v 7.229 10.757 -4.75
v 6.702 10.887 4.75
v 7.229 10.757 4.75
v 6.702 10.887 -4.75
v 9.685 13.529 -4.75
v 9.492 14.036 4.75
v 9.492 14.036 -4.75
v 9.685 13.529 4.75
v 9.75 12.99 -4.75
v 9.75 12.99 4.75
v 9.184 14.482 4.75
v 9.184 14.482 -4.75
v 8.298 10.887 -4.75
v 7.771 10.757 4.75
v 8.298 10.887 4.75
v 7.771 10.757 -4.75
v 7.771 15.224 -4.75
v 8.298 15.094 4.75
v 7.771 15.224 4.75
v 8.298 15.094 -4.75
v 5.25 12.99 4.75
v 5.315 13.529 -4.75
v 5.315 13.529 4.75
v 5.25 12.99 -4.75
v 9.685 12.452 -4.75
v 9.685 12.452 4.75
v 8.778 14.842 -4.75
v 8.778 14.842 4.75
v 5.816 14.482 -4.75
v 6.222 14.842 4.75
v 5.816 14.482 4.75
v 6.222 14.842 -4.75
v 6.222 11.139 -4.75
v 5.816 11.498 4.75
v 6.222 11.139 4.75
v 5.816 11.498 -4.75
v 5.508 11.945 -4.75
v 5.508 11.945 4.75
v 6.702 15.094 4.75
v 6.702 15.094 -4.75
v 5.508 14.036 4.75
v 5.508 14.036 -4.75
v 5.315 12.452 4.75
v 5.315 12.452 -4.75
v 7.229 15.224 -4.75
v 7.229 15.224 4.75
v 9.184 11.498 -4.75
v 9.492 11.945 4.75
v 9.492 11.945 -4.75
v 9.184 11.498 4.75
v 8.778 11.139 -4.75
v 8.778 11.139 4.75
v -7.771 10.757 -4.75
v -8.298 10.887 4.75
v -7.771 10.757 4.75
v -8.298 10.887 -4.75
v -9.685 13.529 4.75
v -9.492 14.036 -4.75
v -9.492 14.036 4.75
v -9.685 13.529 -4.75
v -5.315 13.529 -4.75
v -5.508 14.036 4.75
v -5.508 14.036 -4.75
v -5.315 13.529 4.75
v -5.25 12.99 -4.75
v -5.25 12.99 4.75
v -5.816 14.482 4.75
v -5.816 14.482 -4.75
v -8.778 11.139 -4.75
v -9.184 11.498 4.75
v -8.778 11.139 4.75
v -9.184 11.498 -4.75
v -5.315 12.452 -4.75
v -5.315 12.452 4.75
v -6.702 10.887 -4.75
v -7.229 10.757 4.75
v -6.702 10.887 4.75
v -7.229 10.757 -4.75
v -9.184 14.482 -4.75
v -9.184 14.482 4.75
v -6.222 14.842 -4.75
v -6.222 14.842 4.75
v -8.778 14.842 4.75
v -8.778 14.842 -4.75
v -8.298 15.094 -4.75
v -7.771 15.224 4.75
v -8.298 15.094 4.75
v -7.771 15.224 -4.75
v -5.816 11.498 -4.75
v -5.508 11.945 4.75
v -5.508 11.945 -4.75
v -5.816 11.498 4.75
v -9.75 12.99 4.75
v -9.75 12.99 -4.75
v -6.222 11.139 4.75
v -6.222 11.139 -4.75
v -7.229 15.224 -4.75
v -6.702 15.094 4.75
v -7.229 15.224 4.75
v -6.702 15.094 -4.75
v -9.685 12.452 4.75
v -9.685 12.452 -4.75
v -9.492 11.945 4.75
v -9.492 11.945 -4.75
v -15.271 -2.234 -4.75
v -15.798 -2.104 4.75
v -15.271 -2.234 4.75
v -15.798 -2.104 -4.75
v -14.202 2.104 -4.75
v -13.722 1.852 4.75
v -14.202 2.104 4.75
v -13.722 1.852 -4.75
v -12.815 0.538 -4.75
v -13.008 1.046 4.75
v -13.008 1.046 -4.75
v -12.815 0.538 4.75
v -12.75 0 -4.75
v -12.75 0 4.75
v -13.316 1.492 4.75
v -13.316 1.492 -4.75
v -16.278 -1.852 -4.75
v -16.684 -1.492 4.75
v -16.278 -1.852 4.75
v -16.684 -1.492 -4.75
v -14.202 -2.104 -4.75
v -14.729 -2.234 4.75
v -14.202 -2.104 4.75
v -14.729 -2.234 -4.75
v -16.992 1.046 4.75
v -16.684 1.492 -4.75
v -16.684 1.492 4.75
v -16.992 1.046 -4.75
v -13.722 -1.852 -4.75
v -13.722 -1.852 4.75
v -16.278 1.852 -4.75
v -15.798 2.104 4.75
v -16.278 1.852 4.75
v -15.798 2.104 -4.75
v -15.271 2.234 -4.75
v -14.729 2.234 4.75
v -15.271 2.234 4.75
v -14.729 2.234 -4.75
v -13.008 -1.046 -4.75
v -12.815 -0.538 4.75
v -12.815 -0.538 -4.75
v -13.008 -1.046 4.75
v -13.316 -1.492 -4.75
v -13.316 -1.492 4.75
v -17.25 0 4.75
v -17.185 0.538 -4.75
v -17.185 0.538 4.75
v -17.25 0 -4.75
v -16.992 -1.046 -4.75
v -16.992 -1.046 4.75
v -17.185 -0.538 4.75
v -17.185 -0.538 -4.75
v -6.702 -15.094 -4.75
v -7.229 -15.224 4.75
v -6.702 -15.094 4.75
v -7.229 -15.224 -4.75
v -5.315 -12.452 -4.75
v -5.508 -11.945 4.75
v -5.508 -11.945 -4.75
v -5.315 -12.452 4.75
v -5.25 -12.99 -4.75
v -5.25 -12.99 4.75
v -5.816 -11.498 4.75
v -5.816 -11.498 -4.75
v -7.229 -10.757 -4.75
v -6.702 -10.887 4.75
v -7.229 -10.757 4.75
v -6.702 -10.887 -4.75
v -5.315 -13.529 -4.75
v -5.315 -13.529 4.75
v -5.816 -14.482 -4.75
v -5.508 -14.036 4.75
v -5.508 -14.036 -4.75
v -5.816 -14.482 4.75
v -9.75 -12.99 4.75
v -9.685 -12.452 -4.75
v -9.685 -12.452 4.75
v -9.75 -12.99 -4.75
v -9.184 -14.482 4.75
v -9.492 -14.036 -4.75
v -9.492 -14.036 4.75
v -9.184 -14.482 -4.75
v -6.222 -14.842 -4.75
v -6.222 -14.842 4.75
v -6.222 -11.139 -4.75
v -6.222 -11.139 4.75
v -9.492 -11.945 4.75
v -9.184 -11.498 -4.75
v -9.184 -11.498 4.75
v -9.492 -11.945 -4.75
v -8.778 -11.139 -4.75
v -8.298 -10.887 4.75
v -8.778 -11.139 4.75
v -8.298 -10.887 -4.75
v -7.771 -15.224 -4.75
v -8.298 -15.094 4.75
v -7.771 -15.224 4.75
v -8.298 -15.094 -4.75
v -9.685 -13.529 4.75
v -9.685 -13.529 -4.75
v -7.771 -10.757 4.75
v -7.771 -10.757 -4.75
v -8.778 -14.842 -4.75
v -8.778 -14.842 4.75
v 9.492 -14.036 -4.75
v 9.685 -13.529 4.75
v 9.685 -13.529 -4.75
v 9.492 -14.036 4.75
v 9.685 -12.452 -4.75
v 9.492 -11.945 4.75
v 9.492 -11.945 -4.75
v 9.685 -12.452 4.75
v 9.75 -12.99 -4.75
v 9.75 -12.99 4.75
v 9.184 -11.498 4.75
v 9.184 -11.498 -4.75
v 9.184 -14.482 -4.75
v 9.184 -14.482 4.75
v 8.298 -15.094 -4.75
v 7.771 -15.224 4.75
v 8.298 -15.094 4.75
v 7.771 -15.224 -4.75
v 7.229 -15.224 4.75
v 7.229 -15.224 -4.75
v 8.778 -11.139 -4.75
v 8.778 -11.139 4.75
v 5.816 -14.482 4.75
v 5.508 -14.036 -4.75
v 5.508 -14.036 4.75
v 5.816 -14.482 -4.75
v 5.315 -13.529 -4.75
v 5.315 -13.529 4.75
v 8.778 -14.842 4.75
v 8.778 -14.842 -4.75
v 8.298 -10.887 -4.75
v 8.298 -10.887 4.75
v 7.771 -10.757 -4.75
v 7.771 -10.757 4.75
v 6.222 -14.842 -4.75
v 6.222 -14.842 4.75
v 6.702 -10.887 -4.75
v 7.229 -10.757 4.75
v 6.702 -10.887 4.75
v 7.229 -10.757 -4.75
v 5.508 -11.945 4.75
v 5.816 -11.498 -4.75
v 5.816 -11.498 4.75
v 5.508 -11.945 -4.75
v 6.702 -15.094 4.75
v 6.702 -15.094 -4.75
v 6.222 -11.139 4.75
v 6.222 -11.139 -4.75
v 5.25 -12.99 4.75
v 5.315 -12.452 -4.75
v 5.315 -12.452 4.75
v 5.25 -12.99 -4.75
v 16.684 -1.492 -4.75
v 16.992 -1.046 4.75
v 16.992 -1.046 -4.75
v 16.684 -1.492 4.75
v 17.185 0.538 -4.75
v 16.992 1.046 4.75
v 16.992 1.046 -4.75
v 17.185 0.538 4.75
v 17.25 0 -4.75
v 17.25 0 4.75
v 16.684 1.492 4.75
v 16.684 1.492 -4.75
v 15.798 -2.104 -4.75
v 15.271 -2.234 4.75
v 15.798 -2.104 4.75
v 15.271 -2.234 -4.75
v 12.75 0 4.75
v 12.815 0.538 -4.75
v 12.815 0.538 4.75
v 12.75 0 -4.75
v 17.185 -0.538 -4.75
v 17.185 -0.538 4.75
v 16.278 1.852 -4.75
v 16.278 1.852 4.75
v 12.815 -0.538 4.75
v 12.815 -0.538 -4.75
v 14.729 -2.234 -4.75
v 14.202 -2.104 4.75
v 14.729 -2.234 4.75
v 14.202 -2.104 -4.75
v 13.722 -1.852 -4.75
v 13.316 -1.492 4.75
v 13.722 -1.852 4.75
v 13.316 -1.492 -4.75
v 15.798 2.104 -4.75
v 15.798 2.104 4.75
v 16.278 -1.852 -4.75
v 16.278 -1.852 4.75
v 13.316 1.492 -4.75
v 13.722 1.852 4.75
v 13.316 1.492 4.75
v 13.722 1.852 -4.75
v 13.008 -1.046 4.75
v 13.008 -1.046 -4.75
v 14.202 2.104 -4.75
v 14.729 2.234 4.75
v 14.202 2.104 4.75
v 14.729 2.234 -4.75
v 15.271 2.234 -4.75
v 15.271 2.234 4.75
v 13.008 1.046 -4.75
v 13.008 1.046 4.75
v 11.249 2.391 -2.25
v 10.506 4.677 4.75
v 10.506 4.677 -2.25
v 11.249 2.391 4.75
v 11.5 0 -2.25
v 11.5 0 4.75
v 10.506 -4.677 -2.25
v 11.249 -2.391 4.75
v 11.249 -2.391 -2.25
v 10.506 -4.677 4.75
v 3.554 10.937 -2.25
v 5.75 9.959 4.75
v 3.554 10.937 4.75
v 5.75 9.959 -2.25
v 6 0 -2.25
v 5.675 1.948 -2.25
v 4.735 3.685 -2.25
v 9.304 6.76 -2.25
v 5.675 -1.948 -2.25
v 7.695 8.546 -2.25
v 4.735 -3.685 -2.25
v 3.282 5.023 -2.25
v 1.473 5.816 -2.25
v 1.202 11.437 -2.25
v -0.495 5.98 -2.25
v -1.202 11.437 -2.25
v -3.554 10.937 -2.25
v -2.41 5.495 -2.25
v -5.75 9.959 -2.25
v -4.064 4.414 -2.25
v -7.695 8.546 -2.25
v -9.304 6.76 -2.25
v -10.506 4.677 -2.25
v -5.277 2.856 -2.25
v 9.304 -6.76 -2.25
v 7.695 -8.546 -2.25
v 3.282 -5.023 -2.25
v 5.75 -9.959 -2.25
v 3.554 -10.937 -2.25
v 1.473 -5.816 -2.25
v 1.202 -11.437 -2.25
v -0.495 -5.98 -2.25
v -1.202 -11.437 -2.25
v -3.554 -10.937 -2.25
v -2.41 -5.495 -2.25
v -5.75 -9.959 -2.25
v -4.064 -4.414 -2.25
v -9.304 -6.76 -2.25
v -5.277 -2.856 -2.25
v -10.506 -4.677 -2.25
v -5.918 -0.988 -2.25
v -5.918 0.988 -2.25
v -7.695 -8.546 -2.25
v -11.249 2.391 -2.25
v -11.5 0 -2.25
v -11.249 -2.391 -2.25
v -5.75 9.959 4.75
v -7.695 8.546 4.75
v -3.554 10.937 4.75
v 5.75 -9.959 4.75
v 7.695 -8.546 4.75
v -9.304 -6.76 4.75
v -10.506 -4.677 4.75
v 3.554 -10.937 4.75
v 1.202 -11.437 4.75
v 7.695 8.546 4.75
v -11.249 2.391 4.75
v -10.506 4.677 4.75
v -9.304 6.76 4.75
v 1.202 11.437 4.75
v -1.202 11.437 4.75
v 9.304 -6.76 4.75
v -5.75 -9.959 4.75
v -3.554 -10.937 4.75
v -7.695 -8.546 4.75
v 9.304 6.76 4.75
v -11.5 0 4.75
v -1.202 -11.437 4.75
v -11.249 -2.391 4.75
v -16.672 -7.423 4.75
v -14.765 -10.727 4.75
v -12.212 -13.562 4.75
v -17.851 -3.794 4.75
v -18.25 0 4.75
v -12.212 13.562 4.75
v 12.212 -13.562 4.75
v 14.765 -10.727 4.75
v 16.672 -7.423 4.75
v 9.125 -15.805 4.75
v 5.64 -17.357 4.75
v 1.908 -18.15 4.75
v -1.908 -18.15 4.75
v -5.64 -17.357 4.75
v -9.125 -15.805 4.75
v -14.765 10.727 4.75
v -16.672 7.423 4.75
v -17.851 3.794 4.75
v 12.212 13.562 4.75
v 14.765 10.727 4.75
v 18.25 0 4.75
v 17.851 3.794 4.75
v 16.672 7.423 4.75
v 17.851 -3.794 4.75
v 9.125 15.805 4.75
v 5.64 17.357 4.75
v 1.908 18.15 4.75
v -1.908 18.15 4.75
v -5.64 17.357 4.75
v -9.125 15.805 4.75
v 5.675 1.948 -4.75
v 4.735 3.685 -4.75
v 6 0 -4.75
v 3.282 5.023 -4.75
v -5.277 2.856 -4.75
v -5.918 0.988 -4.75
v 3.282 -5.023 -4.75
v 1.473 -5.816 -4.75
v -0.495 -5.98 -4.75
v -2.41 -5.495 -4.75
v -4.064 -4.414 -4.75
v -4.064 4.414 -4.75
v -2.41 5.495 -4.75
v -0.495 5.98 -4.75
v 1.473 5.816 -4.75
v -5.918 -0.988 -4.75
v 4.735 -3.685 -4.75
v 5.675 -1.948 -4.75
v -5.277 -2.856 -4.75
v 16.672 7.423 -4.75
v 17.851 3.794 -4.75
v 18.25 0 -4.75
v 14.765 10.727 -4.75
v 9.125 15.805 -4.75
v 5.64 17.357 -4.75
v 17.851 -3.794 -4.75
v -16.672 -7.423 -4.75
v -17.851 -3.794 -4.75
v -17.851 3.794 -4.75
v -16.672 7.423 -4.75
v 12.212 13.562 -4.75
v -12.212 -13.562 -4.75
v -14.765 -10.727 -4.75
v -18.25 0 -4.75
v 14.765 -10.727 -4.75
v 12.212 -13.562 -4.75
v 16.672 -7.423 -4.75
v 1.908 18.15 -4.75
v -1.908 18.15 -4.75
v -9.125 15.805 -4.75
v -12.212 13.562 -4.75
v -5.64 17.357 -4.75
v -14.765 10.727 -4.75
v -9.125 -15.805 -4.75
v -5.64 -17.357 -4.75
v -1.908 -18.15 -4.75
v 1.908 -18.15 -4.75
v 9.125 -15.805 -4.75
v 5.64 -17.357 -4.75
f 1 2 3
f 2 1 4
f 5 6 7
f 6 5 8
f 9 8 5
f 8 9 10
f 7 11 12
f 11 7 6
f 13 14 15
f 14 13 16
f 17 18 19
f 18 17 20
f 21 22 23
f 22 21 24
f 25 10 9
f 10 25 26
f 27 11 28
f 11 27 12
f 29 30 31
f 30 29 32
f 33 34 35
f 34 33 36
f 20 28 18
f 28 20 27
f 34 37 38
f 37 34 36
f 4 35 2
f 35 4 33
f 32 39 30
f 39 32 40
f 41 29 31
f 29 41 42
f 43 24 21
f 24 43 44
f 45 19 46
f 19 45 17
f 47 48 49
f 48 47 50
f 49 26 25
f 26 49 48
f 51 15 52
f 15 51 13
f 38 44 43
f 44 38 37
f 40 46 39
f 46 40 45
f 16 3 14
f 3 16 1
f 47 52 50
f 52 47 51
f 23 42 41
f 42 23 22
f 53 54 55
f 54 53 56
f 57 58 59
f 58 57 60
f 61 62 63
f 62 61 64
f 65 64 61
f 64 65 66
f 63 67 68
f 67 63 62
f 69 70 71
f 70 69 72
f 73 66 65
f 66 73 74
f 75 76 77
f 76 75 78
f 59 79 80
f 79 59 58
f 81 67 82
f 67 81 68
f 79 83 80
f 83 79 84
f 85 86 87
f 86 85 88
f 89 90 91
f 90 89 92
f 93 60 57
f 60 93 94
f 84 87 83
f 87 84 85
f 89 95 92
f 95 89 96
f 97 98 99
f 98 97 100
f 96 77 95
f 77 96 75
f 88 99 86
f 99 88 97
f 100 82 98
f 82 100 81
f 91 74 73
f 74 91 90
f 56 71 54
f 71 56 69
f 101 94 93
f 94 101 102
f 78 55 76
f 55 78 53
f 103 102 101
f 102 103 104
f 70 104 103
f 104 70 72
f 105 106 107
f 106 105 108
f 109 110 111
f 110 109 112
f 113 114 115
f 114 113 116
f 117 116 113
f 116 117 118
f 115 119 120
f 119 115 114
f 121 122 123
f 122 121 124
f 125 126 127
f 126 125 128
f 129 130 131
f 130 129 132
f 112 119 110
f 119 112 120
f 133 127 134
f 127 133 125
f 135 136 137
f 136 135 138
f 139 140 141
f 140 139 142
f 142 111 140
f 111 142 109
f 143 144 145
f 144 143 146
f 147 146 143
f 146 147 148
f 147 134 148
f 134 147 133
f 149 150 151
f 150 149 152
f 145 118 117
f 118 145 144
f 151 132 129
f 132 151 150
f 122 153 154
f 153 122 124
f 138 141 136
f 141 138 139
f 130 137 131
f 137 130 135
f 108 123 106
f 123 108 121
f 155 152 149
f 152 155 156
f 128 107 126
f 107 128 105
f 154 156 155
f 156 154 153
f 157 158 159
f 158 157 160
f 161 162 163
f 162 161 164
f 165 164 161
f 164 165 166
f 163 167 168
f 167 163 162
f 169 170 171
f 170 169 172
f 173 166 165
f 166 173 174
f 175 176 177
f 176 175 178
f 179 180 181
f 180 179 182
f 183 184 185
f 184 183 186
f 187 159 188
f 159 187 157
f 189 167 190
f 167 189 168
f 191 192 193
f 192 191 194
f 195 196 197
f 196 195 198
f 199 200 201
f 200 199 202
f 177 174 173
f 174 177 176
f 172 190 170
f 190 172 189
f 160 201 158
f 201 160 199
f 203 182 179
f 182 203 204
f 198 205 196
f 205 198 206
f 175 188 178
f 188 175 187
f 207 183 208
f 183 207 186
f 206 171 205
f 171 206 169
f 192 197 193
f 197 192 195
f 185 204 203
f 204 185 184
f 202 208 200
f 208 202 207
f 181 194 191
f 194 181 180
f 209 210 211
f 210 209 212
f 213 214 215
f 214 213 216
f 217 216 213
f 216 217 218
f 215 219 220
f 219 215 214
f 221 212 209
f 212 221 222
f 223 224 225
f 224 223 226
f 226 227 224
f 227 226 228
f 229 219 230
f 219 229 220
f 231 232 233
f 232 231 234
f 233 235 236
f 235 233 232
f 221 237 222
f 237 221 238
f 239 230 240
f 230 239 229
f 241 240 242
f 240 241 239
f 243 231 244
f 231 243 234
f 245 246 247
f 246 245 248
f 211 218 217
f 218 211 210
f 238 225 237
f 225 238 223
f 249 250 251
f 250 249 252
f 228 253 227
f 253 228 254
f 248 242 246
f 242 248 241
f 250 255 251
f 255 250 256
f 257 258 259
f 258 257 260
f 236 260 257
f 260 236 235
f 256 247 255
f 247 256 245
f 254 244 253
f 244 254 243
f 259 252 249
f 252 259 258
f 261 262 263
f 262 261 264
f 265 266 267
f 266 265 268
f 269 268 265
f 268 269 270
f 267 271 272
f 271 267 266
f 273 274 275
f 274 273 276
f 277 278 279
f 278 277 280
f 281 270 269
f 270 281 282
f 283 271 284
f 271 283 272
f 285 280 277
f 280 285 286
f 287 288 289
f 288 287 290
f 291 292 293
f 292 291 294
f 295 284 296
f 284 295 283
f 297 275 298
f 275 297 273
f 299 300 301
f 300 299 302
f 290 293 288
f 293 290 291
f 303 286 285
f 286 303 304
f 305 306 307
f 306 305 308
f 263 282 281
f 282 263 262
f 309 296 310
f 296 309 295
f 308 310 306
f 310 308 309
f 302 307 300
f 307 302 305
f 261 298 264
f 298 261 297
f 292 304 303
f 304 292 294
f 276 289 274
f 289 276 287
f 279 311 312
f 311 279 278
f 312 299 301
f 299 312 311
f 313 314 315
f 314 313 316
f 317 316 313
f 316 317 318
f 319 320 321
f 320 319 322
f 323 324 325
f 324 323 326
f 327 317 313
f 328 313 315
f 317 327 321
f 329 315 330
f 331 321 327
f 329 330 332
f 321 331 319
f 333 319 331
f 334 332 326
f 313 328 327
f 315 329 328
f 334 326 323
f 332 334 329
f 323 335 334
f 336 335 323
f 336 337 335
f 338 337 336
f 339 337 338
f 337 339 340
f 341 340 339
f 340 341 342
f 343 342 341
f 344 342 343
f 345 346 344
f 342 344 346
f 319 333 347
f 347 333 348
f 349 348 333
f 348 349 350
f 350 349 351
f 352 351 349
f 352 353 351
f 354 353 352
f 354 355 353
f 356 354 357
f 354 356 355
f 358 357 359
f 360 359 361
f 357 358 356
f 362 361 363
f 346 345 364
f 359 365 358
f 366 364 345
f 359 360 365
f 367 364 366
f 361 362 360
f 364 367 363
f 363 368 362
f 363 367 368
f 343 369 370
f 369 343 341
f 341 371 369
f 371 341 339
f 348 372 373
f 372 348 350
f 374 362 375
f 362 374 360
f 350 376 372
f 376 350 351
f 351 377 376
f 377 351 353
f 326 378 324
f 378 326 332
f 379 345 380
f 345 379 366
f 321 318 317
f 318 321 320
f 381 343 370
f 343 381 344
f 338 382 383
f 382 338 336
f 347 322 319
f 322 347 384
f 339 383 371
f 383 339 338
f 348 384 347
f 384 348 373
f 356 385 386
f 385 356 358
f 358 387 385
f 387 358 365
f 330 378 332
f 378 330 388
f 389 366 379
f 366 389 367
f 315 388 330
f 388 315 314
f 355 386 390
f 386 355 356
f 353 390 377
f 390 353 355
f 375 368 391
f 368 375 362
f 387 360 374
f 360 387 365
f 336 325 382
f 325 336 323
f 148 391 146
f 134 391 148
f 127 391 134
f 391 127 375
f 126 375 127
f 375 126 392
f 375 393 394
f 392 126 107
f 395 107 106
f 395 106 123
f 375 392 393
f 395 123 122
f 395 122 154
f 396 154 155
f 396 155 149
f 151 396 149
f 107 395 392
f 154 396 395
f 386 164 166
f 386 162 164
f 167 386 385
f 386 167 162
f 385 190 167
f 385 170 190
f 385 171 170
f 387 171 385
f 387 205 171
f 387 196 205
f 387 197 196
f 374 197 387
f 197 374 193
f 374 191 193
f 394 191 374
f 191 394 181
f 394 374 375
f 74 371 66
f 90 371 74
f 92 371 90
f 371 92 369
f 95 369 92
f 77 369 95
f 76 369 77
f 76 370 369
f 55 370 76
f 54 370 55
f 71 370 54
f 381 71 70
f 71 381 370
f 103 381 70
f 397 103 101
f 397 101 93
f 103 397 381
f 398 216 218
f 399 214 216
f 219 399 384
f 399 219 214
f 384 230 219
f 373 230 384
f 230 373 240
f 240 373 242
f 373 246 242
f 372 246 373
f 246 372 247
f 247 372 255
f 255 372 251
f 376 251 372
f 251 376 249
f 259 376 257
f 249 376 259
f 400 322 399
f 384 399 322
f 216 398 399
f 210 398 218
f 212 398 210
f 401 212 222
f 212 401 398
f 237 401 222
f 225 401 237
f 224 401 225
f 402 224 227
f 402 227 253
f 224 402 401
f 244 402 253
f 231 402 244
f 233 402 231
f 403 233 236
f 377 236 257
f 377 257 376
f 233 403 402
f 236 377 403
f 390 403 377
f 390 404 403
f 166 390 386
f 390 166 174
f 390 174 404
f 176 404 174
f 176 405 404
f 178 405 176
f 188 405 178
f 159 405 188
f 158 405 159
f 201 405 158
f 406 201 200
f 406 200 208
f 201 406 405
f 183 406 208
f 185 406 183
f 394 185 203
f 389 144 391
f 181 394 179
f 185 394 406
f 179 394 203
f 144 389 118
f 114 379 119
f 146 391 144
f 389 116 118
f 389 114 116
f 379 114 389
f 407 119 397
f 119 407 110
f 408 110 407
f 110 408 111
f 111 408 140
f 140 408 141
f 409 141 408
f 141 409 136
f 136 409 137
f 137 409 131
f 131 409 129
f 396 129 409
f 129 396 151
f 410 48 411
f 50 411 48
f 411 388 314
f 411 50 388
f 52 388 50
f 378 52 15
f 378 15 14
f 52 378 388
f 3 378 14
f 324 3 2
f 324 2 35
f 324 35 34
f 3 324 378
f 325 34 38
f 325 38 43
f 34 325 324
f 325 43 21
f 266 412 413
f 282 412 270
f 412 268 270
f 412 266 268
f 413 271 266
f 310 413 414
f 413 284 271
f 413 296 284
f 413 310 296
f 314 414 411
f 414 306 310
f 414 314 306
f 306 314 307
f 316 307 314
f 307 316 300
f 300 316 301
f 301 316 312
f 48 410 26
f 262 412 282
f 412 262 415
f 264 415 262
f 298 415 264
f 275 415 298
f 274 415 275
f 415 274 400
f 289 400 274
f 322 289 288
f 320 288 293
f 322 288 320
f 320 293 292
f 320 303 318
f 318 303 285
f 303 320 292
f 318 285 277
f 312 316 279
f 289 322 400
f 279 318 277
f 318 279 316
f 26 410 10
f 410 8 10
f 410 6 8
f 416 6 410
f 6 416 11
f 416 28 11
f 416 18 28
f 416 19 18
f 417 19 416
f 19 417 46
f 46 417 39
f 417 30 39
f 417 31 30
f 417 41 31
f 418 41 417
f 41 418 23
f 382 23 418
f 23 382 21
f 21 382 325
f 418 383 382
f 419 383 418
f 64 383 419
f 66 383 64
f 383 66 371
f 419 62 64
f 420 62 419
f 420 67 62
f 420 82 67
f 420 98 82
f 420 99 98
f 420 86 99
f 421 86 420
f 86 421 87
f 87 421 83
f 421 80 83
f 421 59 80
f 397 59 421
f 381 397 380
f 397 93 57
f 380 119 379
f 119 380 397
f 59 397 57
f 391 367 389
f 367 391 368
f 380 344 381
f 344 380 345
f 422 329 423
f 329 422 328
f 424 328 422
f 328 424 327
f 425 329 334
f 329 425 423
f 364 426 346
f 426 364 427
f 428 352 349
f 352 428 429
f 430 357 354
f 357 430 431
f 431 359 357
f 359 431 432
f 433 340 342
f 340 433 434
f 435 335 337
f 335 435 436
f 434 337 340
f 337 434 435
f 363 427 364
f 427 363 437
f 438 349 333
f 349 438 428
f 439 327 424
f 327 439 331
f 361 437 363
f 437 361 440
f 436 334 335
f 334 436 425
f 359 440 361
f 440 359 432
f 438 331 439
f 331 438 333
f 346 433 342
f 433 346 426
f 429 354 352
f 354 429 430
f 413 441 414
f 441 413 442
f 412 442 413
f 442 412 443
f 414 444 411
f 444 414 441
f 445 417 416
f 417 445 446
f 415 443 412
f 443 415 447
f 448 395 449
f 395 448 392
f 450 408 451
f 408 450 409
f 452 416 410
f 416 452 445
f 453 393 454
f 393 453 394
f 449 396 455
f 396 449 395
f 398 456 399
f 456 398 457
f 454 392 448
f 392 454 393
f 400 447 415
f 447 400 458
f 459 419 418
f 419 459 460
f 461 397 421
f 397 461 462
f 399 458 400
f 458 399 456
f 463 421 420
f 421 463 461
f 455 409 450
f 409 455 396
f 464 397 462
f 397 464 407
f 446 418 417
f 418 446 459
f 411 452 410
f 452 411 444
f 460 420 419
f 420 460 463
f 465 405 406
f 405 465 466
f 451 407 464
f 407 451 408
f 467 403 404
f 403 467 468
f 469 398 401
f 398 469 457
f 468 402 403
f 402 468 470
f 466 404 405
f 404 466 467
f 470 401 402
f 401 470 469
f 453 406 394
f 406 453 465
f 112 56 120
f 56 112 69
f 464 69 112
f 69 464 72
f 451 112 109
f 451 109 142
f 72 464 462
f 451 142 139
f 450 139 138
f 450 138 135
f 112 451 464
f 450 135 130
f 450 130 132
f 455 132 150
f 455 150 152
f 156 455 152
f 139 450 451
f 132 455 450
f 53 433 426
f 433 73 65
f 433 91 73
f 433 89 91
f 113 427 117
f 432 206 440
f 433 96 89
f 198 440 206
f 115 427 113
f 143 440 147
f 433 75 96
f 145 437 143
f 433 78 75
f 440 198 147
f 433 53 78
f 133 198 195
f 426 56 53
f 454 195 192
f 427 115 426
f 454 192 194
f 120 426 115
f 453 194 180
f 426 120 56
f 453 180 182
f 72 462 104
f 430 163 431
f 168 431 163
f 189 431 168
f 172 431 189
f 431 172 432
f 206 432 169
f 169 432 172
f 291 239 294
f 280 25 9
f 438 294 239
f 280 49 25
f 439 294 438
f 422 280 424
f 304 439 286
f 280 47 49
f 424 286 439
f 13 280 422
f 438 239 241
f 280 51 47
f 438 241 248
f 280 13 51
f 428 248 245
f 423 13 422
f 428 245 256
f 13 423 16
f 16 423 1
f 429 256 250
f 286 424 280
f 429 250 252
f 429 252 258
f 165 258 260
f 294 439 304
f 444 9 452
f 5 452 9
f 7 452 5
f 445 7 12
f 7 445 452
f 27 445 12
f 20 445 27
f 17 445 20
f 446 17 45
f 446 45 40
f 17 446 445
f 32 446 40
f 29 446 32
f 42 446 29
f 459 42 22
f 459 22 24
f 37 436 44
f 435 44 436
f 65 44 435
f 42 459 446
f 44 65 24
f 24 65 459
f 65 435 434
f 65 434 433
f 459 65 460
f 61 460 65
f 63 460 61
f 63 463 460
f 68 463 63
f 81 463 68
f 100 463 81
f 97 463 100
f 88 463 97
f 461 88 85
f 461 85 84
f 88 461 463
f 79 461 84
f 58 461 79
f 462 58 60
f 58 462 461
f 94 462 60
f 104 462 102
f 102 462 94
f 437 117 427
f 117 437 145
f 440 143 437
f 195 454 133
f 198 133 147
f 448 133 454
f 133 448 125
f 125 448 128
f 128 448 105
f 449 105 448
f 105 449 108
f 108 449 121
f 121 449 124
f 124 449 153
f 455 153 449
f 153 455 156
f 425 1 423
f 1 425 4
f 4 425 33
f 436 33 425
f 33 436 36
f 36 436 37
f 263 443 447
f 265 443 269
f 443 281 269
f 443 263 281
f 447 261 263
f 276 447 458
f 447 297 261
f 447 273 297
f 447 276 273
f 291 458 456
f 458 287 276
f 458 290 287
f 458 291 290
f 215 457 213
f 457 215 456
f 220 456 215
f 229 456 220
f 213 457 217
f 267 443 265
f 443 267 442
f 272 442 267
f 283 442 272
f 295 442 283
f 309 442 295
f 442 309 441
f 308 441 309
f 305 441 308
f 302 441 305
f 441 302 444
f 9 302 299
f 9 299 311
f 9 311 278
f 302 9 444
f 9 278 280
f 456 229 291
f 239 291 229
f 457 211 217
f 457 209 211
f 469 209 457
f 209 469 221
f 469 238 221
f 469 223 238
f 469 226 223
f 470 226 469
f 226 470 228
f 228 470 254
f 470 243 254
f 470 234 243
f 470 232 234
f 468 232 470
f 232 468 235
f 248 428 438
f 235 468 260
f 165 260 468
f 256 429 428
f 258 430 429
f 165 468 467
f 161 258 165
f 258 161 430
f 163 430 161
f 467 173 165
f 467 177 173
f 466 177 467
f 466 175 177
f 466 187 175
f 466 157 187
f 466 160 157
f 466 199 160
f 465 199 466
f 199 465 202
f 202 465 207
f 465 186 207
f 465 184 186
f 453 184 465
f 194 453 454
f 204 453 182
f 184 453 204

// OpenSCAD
// file: gear_peristaltic.scad
/******************************************************/
/* PLYUMP                                             */
/* file: gear_peristaltic.scad                        */
/* author: Luis Rodriguez                             */
/* version: 0.32                                      */
/* w3b: tiny.cc/lyu                                   */
/* info:                                              */
/******************************************************/

include <parameters.scad>
use <involute_gears.scad>

// Testing
gear_peristaltic();

/* MODULES */

module gear_peristaltic(){
	difference(){
		union(){ // Add
			half_gear_peristaltic();
			mirror([0,0,1])
			half_gear_peristaltic();
		}
		union(){ // Substract
			central_bearings();
			rollers_shafts();
		}
	}
}

// Half herringbone peristaltic gear
module half_gear_peristaltic(){
	gear (number_of_teeth=gear_peristaltic_teeth,
		circular_pitch=circular_pitch,
		pressure_angle=pressure_angle,
		gear_thickness = gear_peristaltic_thickness/2,
		rim_thickness = gear_peristaltic_thickness/2,
		hub_thickness = 0,
		twist=twist/gear_peristaltic_teeth);
}

module central_bearings(){
	cylinder(r=(608zz_outside_diameter+bearings_clearance)/2, h=608zz_thickness*4, $fn = birthday_day, center=true);
}

module rollers_shafts(){
	for ( i = [ 1 : rollers_number ] ) {
		translate( [ rollers_position_minimum_radius * cos( rollers_angle * i ), 
			rollers_position_minimum_radius * sin( rollers_angle * i ),  
			0])
		cylinder( r = rollers_shaft_diameter/2 , h = 608zz_thickness*4, $fn = birthday_day , center=true);
	}
}
// file: parameters.scad
/******************************************************/
/* PLYUMP                                             */
/* file: parameters.scad                              */
/* author: Luis Rodriguez                             */
/* version: 0.32                                      */
/* w3b: tiny.cc/lyu                                   */
/* info: This file contains all the shared parameters */
/******************************************************/

birthday_day = 26;

/* Bearings dimensions (mm) */
bearings_clearance = 0.5; 	// Used to "easily fit bearings into their holes"
// 608zz id=8 od=22 thickness=7
608zz_inside_diameter = 8;
608zz_outside_diameter = 22;
608zz_thickness = 7;

// 624zz id=4 od=13 thickness=5
624zz_inside_diameter = 4;
624zz_outside_diameter = 13;
624zz_thickness = 5;

/* NEMA 17 */
nema_17_height = 42.2;
nema_17_screw_distance = 31.04;
nema_rollers_clearance = 3;

/* ROLLERS */
rollers_number = 6;
rollers_clearance = 4;
rollers_angle = 360 / ( rollers_number );
rollers_wall = 0;
rollers_diameter = 624zz_outside_diameter + rollers_wall * 2;
rollers_radius = rollers_diameter / 2;
rollers_shaft_diameter = 624zz_inside_diameter + bearings_clearance;
rollers_bearings_contacts_thickness = 2;
rollers_bearings_contacts_height = 3;

rollers_width = 624zz_thickness * 5;
rollers_easy_printing_inverted_cone_thickness = 624zz_thickness;

rollers_holder_thickness = 624zz_thickness/2;
rollers_holder_central_bearing_support_thickness = 3;
rollers_holder_central_bearing_support_height = 624zz_thickness;

rollers_radius_plus_clearance = rollers_radius + rollers_clearance / 2;
rollers_position_minimum_radius_minus_roller_radius = ( rollers_radius_plus_clearance - sin( rollers_angle / 2 ) 
	* rollers_radius_plus_clearance ) / sin( rollers_angle / 2 ) ;

if ( rollers_position_minimum_radius_minus_roller_radius < 608zz_inside_diameter) {

	echo(str(" THE ROLLERS WILL CRASH THE CENTRAL SHAFT, change the rollers_position_minimum_radius; " ) );
}

//rollers_position_minimum_radius = 608zz_inside_diameter + rollers_radius;
rollers_position_minimum_radius = rollers_position_minimum_radius_minus_roller_radius + rollers_radius;
echo(str("Rollers position radius = ", rollers_position_minimum_radius ) );

rollers_exterior_radius = rollers_position_minimum_radius + rollers_radius;
echo(str("Rollers exterior radius = ", rollers_exterior_radius ) );

/* Gears */
// Common
gear_ratio = 3;
gear_motor_teeth = 11;
gear_peristaltic_teeth = gear_ratio*gear_motor_teeth;
gear_peristaltic_thickness = 608zz_thickness * 2; // "*2" due to herringbone!

// Circular pitch is calculate through pitch radius for peristaltic and motor gear
// in order to avoid rollers crashing nema 17 motor
//
// 		nema_17_height + rollers_position_minimum_radius + rollers_radius + nema_rollers_clearance = 
// 		gear_peristaltic_pitch_radius + gear_motor_pitch_radius
//
//		gear_peristaltic_pitch_radius + gear_motor_pitch_radius =
//		gear_peristaltic_teeth * circular_pitch / 360 + gear_motor_teeth * circular_pitch / 360 =
//		(gear_peristaltic_teeth + gear_motor_teeth)/360 * circular_pitch
//
//		circular_pitch = 
//		360*(nema_17_height + rollers_position_minimum_radius + rollers_radius + nema_rollers_clearance) /
//		(gear_peristaltic_teeth + gear_motor_teeth)	

//circular_pitch = 360*gear_peristaltic_radius/gear_peristaltic_teeth;
circular_pitch = 360 * (nema_17_height/2 + rollers_position_minimum_radius + rollers_radius + nema_rollers_clearance) /
		(gear_peristaltic_teeth + gear_motor_teeth);

// Pitch diameter: Diameter of pitch circle.
gear_peristaltic_pitch_diameter = gear_peristaltic_teeth * circular_pitch / 180;
gear_peristaltic_pitch_radius = gear_peristaltic_pitch_diameter/2;
echo(str("Pitch radius gear peristaltic= ",gear_peristaltic_pitch_radius));
// Diametrial pitch: Number of teeth per unit length.
gear_peristaltic_pitch_diametrial = gear_peristaltic_teeth / gear_peristaltic_pitch_diameter;
// Addendum: Radial distance from pitch circle to outside circle.
gear_peristaltic_addendum = 1/gear_peristaltic_pitch_diametrial;
//Outer Circle
gear_peristaltic_outside_radius = gear_peristaltic_pitch_radius+gear_peristaltic_addendum;
echo(str("Outside radius gear peristaltic= ",gear_peristaltic_outside_radius));

gear_motor_height = 8;
gear_motor_neck_height = 10;
gear_motor_neck_diameter = 18;
gear_motor_thickness = 608zz_thickness * 2; // "*2" due to herringbone!
gear_motor_shaft_diameter = 5.5;

// Pitch diameter: Diameter of pitch circle.
gear_motor_pitch_diameter = gear_motor_teeth * circular_pitch / 180;
gear_motor_pitch_radius = gear_motor_pitch_diameter/2;
echo(str("Pitch radius gear motor= ",gear_motor_pitch_radius));
// Diametrial pitch: Number of teeth per unit length.
gear_motor_pitch_diametrial = gear_motor_teeth / gear_motor_pitch_diameter;
// Addendum: Radial distance from pitch circle to outside circle.
gear_motor_addendum = 1/gear_motor_pitch_diametrial;
//Outer Circle
gear_motor_outside_radius = gear_motor_pitch_radius+gear_motor_addendum;
echo(str("Outside radius gear motor= ",gear_motor_outside_radius));

pressure_angle=30;
twist=200;

gear_motor_bolt_width = 3;
gear_motor_bolt_length = 5.8;

3mm_screw_radius = 3.4/2;

pinched_tube = 3;
// main file
/******************************************************/
/* PLYUMP                                             */
/* file: rollers_holder.scad                         */
/* author: Luis Rodriguez                             */
/* version: 0.32                                      */
/* w3b: tiny.cc/lyu                                   */
/* info:                                              */
/******************************************************/

include <parameters.scad>
use <gear_peristaltic.scad>

// Testing
rollers_holder();

/* MODULES */

module rollers_holder(){
	difference(){
		union(){ // Add
			body();
		}
		union(){ // Substract
			central_bearing_support();
			central_shaft();
			rollers_shafts(); // this comes from gear_peristaltic.scad
		}
	}
}

module body(){
	cylinder(r=rollers_position_minimum_radius + rollers_radius/2, h=rollers_holder_thickness + 608zz_thickness, center=true);
}

module central_shaft(){
	cylinder(r=608zz_inside_diameter/2 + bearings_clearance * 4, h=rollers_holder_thickness + rollers_holder_central_bearing_support_height * 2, center=true);
}

module central_bearing_support(){
	translate([0, 0, rollers_holder_thickness/2])
		#cylinder(r=608zz_outside_diameter/2 + bearings_clearance, h=608zz_thickness, center=true);
}
